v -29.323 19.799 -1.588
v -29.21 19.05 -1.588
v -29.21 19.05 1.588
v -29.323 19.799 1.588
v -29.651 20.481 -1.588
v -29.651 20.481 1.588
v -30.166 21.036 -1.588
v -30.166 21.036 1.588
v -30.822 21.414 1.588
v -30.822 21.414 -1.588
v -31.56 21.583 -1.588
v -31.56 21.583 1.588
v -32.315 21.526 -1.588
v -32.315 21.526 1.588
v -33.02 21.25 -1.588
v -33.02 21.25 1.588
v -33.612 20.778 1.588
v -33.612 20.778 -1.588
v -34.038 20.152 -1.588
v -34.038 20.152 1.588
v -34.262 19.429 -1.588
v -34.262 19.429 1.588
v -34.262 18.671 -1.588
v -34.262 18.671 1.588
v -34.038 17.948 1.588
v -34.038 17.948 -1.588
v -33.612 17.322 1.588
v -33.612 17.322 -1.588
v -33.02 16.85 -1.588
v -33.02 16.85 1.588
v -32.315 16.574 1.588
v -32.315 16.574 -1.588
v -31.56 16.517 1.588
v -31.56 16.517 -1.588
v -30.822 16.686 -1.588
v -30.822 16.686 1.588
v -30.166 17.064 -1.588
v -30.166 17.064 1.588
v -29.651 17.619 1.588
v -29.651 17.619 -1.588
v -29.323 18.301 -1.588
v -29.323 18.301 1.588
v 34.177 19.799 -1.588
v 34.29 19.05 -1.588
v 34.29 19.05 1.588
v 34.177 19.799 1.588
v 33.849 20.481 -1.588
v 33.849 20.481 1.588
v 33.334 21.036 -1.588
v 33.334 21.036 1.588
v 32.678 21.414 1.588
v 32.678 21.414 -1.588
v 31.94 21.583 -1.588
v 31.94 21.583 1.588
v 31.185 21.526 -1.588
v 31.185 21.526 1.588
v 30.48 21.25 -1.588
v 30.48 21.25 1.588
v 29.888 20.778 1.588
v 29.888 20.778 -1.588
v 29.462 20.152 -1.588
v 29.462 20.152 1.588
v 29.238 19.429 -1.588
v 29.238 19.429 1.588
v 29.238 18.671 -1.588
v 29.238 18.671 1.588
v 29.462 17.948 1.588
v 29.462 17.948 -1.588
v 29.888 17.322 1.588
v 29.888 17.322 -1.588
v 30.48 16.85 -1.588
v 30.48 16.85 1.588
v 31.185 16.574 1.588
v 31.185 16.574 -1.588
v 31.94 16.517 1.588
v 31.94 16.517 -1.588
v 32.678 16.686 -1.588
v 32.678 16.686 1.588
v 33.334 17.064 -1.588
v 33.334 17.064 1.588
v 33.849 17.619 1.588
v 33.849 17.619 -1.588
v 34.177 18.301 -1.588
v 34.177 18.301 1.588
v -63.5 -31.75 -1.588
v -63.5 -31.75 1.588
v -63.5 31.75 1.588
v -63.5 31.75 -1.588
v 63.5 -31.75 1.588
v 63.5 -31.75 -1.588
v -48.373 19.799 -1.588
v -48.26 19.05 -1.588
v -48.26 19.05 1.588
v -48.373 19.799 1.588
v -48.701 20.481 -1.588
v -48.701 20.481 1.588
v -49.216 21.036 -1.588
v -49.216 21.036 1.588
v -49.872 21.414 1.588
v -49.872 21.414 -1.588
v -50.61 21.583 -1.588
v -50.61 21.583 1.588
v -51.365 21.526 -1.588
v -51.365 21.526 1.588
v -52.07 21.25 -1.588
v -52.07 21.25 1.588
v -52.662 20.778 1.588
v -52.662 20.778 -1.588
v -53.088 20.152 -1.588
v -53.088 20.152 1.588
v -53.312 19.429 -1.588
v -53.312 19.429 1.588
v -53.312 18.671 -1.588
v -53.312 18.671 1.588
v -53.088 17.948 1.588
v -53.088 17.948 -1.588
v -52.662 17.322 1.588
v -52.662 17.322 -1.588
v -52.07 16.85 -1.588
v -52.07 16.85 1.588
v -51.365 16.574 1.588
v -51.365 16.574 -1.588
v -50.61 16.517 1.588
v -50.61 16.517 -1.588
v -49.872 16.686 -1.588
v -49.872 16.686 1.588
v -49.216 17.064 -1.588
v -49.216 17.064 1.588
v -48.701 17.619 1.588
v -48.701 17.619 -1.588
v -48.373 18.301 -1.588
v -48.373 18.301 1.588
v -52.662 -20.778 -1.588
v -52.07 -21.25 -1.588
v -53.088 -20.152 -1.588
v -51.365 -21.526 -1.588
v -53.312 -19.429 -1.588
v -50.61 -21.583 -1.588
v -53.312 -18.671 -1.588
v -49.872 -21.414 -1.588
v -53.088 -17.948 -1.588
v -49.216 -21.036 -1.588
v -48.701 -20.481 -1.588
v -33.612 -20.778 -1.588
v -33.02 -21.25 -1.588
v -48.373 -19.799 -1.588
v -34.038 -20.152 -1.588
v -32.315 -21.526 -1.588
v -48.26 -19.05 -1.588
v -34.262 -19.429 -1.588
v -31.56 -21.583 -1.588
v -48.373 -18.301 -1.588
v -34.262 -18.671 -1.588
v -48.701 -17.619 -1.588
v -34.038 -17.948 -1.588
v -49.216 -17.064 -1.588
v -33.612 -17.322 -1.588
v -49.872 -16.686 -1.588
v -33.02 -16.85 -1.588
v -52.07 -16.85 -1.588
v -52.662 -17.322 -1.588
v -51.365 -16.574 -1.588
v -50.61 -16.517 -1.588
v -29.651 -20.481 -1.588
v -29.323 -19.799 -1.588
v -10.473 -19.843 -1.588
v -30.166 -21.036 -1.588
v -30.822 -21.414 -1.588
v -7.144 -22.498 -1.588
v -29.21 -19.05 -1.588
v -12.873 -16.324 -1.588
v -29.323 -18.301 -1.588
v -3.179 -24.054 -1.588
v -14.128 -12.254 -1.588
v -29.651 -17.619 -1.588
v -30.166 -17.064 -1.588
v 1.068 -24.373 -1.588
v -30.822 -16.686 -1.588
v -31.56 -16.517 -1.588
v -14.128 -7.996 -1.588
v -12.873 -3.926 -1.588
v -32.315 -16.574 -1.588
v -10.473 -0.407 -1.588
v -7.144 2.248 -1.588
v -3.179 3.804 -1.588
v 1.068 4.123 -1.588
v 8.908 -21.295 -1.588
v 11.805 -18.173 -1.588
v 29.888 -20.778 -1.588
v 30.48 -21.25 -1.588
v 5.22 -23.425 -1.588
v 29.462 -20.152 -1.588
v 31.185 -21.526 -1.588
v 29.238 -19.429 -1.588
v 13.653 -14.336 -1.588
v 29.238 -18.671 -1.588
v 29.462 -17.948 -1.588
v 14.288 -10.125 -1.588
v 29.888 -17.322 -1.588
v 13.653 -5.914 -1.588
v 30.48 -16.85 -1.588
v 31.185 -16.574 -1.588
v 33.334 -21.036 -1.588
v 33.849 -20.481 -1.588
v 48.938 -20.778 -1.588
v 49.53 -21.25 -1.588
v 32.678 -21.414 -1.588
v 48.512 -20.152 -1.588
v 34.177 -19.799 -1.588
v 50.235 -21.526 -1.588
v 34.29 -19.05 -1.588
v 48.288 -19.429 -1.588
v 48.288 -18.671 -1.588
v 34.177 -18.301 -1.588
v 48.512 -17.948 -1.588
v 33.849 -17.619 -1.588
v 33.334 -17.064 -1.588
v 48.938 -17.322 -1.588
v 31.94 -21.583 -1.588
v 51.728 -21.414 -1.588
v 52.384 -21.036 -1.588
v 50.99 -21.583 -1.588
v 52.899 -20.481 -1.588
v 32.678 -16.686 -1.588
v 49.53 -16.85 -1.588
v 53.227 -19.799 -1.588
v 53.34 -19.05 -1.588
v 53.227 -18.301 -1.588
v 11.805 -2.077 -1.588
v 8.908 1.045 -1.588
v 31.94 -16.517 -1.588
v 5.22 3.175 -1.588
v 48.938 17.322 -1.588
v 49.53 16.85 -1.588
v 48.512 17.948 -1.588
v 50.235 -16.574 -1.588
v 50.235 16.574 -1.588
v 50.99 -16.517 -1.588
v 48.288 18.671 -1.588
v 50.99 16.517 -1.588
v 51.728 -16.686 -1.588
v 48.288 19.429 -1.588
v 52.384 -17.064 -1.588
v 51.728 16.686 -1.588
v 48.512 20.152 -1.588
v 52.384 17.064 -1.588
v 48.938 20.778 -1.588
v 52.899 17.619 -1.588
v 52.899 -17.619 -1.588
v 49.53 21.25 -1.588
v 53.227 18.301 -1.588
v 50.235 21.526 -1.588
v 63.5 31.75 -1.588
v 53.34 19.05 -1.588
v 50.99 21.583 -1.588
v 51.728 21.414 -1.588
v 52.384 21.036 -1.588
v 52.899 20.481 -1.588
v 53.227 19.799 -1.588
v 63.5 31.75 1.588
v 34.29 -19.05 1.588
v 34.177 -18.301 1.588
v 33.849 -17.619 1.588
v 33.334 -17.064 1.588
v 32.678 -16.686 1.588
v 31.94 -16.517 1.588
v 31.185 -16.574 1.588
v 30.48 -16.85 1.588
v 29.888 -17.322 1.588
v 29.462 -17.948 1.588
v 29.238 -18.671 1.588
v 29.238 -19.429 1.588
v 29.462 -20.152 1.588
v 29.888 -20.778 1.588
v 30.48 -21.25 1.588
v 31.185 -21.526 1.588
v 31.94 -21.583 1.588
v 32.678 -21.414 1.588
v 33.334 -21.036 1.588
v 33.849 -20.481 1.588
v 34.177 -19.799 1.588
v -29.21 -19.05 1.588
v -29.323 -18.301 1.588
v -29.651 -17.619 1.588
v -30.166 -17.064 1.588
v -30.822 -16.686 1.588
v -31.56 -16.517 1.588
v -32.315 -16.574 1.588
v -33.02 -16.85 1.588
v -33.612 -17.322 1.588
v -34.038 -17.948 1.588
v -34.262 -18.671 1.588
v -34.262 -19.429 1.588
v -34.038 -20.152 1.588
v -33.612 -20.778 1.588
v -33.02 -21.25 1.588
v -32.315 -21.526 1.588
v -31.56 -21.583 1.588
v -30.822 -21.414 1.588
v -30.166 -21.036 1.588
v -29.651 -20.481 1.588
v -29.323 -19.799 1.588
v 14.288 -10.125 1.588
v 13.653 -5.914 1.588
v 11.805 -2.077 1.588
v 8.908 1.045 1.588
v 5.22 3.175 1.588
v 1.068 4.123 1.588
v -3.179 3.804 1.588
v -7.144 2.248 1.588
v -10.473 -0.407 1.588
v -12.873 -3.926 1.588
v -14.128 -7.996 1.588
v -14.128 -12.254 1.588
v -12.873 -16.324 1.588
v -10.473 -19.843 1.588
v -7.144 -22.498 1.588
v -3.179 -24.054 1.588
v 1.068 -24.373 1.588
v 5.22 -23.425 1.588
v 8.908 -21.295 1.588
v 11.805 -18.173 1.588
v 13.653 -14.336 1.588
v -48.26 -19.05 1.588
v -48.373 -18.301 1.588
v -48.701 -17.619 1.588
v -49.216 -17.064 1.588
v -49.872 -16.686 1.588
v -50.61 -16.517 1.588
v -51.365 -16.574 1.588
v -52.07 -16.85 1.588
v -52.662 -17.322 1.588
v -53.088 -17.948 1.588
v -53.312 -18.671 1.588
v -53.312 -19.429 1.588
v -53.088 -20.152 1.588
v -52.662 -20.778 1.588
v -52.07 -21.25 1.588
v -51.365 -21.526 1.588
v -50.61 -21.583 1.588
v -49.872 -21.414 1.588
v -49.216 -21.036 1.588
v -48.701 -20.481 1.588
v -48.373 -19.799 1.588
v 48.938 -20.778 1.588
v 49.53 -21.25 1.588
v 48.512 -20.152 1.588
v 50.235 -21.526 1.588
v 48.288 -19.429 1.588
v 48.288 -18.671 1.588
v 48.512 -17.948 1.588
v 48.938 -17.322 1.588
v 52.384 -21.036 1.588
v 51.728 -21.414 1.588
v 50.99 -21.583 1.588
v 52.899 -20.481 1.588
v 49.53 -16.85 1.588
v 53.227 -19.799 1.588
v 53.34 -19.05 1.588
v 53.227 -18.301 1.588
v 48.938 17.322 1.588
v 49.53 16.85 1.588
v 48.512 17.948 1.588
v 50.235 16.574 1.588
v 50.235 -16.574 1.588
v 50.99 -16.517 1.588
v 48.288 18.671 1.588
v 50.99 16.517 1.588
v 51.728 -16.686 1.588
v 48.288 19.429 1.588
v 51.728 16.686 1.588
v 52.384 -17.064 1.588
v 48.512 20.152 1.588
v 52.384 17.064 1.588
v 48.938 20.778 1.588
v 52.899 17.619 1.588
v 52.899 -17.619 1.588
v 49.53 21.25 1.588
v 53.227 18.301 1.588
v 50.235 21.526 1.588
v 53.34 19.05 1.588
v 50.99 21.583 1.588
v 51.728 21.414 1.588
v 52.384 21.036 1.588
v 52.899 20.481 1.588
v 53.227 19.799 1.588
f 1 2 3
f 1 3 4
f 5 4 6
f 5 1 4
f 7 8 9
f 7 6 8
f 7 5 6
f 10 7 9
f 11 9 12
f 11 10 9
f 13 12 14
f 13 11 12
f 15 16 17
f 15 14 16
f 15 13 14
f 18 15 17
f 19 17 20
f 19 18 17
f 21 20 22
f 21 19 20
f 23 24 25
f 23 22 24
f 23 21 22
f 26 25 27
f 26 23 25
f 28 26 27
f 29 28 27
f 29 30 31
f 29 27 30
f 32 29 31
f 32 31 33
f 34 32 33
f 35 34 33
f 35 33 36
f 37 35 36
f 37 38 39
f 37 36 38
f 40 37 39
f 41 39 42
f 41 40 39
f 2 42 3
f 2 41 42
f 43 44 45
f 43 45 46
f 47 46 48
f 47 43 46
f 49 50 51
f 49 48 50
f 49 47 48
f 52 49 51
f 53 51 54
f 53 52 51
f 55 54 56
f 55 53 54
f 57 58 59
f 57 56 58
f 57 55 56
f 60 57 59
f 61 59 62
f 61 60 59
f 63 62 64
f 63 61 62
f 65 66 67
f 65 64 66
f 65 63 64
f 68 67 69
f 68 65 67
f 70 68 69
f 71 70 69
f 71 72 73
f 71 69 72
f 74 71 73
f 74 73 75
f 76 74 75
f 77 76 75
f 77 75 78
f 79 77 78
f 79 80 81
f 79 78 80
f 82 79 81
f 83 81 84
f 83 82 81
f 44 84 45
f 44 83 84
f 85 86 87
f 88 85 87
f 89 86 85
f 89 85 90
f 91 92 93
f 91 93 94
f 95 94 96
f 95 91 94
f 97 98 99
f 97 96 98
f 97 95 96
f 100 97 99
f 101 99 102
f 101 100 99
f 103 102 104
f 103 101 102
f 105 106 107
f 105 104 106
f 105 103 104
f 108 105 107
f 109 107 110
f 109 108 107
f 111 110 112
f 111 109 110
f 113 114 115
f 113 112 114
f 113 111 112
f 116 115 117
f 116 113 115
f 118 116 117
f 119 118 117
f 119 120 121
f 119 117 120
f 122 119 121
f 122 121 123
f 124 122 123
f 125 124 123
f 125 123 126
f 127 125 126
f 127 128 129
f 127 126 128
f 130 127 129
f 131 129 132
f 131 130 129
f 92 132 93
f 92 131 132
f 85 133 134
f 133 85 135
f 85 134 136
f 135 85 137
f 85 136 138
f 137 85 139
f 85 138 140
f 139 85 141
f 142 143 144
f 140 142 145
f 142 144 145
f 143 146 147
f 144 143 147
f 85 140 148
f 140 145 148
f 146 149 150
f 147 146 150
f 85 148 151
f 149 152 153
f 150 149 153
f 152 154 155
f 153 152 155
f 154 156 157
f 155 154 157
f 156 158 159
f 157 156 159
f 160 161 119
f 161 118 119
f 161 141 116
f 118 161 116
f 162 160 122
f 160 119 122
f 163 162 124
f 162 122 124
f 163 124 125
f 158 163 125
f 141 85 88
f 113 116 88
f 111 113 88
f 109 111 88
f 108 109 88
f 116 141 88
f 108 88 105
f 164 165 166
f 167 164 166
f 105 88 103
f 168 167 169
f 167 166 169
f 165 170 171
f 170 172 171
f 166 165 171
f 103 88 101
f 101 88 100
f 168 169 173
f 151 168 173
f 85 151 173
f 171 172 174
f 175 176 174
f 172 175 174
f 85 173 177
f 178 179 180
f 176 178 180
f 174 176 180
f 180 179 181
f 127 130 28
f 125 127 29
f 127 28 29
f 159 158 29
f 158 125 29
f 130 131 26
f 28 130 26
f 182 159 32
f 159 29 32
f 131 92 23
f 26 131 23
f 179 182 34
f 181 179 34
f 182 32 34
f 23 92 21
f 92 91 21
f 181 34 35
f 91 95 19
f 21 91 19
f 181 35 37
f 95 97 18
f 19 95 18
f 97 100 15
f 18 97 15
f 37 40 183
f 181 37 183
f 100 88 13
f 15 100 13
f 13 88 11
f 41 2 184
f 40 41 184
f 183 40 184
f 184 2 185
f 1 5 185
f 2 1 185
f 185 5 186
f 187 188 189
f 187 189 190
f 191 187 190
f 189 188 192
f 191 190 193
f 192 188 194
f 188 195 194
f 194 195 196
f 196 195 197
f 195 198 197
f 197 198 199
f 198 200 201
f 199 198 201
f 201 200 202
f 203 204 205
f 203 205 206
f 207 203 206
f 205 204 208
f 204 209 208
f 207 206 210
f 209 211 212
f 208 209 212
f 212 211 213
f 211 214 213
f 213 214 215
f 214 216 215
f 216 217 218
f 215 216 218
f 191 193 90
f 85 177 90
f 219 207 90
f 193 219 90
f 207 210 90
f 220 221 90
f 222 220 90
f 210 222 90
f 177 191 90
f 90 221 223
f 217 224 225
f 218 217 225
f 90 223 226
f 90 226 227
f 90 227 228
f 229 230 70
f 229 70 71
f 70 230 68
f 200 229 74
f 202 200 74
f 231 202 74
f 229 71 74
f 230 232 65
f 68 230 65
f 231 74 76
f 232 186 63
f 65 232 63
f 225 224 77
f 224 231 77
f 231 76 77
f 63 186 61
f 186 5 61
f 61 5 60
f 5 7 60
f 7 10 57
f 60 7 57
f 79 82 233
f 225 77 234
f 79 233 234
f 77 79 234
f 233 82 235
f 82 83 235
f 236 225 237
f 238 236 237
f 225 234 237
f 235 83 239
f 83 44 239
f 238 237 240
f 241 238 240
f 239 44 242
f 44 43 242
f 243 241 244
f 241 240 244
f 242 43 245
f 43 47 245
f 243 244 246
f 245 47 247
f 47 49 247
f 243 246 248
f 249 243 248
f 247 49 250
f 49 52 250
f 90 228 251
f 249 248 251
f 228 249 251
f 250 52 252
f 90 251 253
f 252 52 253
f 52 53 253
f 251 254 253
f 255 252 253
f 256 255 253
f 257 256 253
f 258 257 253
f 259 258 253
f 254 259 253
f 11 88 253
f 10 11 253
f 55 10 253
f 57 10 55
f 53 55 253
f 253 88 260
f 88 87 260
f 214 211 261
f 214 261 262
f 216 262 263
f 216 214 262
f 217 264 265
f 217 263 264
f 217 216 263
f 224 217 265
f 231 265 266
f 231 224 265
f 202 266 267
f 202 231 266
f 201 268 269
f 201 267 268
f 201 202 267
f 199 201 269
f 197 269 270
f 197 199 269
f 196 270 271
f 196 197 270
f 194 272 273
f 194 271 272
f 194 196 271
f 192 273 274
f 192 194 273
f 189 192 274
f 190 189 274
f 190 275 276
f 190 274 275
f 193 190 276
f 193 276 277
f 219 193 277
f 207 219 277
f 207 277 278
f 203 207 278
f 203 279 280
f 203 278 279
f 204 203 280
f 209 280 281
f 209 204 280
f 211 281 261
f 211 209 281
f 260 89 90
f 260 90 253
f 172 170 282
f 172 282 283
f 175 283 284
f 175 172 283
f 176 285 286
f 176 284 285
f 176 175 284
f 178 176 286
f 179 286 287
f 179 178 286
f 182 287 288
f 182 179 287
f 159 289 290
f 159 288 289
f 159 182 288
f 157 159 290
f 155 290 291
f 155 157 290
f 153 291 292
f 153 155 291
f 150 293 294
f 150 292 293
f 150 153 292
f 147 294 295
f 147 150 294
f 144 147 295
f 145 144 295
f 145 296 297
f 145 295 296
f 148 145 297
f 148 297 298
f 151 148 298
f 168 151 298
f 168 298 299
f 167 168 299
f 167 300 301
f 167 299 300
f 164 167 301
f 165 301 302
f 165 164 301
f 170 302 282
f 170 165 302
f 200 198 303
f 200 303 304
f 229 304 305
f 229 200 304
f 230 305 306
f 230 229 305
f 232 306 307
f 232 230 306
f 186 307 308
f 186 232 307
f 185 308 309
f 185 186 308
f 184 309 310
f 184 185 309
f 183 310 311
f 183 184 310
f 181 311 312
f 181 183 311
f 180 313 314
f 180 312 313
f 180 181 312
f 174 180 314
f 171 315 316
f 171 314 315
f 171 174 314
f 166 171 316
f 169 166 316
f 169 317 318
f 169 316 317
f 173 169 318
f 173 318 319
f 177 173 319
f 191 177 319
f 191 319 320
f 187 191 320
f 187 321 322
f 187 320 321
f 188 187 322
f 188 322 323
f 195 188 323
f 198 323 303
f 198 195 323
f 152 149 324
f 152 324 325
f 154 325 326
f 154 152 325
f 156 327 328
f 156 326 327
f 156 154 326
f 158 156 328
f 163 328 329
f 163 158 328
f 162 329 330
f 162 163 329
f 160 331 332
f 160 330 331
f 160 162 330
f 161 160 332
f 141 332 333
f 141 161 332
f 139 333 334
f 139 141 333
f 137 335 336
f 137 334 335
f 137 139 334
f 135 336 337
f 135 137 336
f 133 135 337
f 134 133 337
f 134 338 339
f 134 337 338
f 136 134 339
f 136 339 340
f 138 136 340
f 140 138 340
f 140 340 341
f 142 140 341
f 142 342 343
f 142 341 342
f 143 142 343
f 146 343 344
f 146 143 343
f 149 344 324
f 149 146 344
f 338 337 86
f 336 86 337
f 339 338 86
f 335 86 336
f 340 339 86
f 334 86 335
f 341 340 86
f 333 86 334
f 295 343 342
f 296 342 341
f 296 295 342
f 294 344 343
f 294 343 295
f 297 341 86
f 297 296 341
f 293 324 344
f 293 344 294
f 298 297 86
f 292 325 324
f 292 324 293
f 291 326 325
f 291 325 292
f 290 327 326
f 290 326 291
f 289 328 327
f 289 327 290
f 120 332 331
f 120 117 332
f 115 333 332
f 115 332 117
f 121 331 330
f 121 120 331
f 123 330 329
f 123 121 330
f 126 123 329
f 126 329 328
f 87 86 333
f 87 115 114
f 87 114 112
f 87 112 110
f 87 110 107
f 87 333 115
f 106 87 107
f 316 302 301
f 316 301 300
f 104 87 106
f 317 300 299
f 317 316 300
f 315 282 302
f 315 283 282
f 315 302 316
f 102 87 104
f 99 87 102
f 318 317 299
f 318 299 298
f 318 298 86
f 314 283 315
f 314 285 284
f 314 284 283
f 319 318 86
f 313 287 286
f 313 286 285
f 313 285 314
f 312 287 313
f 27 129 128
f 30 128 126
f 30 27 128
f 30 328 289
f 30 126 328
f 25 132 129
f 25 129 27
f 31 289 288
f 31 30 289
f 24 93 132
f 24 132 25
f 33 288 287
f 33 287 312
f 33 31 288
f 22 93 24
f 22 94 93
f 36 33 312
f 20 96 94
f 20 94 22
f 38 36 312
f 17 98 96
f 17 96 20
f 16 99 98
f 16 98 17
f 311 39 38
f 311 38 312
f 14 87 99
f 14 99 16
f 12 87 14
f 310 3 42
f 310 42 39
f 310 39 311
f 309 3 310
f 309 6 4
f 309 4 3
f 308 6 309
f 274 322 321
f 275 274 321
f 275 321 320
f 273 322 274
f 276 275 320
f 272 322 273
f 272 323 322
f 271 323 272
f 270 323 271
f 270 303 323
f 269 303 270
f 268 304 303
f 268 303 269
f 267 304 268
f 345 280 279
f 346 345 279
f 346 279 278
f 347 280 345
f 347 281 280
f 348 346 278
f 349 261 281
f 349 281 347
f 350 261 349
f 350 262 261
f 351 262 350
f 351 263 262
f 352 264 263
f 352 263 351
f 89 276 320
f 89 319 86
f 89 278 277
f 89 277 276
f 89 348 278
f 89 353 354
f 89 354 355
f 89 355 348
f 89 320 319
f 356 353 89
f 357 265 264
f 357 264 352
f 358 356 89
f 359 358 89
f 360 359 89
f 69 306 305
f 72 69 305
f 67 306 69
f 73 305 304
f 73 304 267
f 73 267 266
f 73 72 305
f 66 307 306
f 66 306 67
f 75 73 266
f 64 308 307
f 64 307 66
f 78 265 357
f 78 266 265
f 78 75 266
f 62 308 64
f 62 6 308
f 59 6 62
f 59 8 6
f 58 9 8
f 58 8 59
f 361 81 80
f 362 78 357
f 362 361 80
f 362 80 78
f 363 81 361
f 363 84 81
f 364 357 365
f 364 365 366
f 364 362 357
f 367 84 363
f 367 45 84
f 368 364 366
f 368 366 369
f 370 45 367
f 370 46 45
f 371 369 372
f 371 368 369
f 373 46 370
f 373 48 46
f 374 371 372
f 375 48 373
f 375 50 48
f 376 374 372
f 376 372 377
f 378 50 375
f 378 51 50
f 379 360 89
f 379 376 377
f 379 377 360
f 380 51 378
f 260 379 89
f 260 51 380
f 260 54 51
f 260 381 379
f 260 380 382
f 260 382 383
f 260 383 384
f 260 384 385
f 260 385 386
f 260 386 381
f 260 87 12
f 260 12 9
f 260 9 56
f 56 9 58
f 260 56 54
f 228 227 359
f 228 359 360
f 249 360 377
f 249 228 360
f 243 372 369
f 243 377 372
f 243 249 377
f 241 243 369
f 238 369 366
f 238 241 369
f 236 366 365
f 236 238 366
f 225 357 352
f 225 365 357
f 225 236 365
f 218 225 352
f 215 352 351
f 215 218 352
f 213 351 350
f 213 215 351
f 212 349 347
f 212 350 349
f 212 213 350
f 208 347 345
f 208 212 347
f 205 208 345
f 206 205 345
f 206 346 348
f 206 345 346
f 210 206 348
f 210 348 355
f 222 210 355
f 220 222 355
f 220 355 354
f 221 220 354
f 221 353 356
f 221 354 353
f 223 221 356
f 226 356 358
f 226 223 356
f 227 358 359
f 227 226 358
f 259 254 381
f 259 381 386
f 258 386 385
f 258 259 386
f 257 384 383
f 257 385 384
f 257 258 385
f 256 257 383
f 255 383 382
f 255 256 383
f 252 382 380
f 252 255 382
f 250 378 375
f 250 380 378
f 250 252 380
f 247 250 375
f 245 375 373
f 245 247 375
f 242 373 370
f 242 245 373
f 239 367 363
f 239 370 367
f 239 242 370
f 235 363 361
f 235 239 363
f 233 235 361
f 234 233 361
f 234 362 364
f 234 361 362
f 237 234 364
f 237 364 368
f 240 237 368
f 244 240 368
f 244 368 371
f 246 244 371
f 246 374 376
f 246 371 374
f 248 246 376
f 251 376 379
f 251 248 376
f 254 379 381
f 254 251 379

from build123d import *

# Parameters (mm, degrees)
SKETCH1_W               = 127
SKETCH1_H               = 63.5
BOSS_EXTRUDE1_DEPTH     = 1.5875
CUT_EXTRUDE2_DEPTH      = 72.066117982
CUT_EXTRUDE2_DEPTH_BACK = 72.066117982
SKETCH3_R               = 14.2875
CUT_EXTRUDE3_DEPTH      = 72.012904857
CUT_EXTRUDE3_DEPTH_BACK = 72.012904857
SKETCH4_R               = 2.54
CUT_EXTRUDE4_DEPTH      = 72.012904857
CUT_EXTRUDE4_DEPTH_BACK = 72.012904857
SKETCH5_R               = 2.54


with BuildPart() as part:
    # Sketch1 → Boss-Extrude1 (new, symmetric)
    with BuildSketch(Plane.XY):
        Rectangle(SKETCH1_W, SKETCH1_H)
    extrude(amount=BOSS_EXTRUDE1_DEPTH, both=True)

    # Sketch3 → Cut-Extrude2 (cut, two sides: drawn at the far end of the back side and taken through both)
    with BuildSketch(Plane.XY.offset(1.5875).offset(-CUT_EXTRUDE2_DEPTH_BACK)):
        with Locations((0, -10.125)):
            Circle(SKETCH3_R)
    extrude(amount=CUT_EXTRUDE2_DEPTH + CUT_EXTRUDE2_DEPTH_BACK, mode=Mode.SUBTRACT)

    # Sketch4 → Cut-Extrude3 (cut, two sides: drawn at the far end of the back side and taken through both)
    with BuildSketch(Plane.XY.offset(-CUT_EXTRUDE3_DEPTH_BACK)):
        with Locations((-50.8, 19.05)):
            Circle(SKETCH4_R)
        with Locations((-50.8, -19.05)):
            Circle(SKETCH4_R)
        with Locations((50.8, -19.05)):
            Circle(SKETCH4_R)
        with Locations((50.8, 19.05)):
            Circle(SKETCH4_R)
    extrude(amount=CUT_EXTRUDE3_DEPTH + CUT_EXTRUDE3_DEPTH_BACK, mode=Mode.SUBTRACT)

    # Sketch5 → Cut-Extrude4 (cut, two sides: drawn at the far end of the back side and taken through both)
    with BuildSketch(Plane.XY.offset(-CUT_EXTRUDE4_DEPTH_BACK)):
        with Locations((31.75, 19.05)):
            Circle(SKETCH5_R)
        with Locations((-31.75, 19.05)):
            Circle(SKETCH5_R)
        with Locations((-31.75, -19.05)):
            Circle(SKETCH5_R)
        with Locations((31.75, -19.05)):
            Circle(SKETCH5_R)
    extrude(amount=CUT_EXTRUDE4_DEPTH + CUT_EXTRUDE4_DEPTH_BACK, mode=Mode.SUBTRACT)


solid = part.part
